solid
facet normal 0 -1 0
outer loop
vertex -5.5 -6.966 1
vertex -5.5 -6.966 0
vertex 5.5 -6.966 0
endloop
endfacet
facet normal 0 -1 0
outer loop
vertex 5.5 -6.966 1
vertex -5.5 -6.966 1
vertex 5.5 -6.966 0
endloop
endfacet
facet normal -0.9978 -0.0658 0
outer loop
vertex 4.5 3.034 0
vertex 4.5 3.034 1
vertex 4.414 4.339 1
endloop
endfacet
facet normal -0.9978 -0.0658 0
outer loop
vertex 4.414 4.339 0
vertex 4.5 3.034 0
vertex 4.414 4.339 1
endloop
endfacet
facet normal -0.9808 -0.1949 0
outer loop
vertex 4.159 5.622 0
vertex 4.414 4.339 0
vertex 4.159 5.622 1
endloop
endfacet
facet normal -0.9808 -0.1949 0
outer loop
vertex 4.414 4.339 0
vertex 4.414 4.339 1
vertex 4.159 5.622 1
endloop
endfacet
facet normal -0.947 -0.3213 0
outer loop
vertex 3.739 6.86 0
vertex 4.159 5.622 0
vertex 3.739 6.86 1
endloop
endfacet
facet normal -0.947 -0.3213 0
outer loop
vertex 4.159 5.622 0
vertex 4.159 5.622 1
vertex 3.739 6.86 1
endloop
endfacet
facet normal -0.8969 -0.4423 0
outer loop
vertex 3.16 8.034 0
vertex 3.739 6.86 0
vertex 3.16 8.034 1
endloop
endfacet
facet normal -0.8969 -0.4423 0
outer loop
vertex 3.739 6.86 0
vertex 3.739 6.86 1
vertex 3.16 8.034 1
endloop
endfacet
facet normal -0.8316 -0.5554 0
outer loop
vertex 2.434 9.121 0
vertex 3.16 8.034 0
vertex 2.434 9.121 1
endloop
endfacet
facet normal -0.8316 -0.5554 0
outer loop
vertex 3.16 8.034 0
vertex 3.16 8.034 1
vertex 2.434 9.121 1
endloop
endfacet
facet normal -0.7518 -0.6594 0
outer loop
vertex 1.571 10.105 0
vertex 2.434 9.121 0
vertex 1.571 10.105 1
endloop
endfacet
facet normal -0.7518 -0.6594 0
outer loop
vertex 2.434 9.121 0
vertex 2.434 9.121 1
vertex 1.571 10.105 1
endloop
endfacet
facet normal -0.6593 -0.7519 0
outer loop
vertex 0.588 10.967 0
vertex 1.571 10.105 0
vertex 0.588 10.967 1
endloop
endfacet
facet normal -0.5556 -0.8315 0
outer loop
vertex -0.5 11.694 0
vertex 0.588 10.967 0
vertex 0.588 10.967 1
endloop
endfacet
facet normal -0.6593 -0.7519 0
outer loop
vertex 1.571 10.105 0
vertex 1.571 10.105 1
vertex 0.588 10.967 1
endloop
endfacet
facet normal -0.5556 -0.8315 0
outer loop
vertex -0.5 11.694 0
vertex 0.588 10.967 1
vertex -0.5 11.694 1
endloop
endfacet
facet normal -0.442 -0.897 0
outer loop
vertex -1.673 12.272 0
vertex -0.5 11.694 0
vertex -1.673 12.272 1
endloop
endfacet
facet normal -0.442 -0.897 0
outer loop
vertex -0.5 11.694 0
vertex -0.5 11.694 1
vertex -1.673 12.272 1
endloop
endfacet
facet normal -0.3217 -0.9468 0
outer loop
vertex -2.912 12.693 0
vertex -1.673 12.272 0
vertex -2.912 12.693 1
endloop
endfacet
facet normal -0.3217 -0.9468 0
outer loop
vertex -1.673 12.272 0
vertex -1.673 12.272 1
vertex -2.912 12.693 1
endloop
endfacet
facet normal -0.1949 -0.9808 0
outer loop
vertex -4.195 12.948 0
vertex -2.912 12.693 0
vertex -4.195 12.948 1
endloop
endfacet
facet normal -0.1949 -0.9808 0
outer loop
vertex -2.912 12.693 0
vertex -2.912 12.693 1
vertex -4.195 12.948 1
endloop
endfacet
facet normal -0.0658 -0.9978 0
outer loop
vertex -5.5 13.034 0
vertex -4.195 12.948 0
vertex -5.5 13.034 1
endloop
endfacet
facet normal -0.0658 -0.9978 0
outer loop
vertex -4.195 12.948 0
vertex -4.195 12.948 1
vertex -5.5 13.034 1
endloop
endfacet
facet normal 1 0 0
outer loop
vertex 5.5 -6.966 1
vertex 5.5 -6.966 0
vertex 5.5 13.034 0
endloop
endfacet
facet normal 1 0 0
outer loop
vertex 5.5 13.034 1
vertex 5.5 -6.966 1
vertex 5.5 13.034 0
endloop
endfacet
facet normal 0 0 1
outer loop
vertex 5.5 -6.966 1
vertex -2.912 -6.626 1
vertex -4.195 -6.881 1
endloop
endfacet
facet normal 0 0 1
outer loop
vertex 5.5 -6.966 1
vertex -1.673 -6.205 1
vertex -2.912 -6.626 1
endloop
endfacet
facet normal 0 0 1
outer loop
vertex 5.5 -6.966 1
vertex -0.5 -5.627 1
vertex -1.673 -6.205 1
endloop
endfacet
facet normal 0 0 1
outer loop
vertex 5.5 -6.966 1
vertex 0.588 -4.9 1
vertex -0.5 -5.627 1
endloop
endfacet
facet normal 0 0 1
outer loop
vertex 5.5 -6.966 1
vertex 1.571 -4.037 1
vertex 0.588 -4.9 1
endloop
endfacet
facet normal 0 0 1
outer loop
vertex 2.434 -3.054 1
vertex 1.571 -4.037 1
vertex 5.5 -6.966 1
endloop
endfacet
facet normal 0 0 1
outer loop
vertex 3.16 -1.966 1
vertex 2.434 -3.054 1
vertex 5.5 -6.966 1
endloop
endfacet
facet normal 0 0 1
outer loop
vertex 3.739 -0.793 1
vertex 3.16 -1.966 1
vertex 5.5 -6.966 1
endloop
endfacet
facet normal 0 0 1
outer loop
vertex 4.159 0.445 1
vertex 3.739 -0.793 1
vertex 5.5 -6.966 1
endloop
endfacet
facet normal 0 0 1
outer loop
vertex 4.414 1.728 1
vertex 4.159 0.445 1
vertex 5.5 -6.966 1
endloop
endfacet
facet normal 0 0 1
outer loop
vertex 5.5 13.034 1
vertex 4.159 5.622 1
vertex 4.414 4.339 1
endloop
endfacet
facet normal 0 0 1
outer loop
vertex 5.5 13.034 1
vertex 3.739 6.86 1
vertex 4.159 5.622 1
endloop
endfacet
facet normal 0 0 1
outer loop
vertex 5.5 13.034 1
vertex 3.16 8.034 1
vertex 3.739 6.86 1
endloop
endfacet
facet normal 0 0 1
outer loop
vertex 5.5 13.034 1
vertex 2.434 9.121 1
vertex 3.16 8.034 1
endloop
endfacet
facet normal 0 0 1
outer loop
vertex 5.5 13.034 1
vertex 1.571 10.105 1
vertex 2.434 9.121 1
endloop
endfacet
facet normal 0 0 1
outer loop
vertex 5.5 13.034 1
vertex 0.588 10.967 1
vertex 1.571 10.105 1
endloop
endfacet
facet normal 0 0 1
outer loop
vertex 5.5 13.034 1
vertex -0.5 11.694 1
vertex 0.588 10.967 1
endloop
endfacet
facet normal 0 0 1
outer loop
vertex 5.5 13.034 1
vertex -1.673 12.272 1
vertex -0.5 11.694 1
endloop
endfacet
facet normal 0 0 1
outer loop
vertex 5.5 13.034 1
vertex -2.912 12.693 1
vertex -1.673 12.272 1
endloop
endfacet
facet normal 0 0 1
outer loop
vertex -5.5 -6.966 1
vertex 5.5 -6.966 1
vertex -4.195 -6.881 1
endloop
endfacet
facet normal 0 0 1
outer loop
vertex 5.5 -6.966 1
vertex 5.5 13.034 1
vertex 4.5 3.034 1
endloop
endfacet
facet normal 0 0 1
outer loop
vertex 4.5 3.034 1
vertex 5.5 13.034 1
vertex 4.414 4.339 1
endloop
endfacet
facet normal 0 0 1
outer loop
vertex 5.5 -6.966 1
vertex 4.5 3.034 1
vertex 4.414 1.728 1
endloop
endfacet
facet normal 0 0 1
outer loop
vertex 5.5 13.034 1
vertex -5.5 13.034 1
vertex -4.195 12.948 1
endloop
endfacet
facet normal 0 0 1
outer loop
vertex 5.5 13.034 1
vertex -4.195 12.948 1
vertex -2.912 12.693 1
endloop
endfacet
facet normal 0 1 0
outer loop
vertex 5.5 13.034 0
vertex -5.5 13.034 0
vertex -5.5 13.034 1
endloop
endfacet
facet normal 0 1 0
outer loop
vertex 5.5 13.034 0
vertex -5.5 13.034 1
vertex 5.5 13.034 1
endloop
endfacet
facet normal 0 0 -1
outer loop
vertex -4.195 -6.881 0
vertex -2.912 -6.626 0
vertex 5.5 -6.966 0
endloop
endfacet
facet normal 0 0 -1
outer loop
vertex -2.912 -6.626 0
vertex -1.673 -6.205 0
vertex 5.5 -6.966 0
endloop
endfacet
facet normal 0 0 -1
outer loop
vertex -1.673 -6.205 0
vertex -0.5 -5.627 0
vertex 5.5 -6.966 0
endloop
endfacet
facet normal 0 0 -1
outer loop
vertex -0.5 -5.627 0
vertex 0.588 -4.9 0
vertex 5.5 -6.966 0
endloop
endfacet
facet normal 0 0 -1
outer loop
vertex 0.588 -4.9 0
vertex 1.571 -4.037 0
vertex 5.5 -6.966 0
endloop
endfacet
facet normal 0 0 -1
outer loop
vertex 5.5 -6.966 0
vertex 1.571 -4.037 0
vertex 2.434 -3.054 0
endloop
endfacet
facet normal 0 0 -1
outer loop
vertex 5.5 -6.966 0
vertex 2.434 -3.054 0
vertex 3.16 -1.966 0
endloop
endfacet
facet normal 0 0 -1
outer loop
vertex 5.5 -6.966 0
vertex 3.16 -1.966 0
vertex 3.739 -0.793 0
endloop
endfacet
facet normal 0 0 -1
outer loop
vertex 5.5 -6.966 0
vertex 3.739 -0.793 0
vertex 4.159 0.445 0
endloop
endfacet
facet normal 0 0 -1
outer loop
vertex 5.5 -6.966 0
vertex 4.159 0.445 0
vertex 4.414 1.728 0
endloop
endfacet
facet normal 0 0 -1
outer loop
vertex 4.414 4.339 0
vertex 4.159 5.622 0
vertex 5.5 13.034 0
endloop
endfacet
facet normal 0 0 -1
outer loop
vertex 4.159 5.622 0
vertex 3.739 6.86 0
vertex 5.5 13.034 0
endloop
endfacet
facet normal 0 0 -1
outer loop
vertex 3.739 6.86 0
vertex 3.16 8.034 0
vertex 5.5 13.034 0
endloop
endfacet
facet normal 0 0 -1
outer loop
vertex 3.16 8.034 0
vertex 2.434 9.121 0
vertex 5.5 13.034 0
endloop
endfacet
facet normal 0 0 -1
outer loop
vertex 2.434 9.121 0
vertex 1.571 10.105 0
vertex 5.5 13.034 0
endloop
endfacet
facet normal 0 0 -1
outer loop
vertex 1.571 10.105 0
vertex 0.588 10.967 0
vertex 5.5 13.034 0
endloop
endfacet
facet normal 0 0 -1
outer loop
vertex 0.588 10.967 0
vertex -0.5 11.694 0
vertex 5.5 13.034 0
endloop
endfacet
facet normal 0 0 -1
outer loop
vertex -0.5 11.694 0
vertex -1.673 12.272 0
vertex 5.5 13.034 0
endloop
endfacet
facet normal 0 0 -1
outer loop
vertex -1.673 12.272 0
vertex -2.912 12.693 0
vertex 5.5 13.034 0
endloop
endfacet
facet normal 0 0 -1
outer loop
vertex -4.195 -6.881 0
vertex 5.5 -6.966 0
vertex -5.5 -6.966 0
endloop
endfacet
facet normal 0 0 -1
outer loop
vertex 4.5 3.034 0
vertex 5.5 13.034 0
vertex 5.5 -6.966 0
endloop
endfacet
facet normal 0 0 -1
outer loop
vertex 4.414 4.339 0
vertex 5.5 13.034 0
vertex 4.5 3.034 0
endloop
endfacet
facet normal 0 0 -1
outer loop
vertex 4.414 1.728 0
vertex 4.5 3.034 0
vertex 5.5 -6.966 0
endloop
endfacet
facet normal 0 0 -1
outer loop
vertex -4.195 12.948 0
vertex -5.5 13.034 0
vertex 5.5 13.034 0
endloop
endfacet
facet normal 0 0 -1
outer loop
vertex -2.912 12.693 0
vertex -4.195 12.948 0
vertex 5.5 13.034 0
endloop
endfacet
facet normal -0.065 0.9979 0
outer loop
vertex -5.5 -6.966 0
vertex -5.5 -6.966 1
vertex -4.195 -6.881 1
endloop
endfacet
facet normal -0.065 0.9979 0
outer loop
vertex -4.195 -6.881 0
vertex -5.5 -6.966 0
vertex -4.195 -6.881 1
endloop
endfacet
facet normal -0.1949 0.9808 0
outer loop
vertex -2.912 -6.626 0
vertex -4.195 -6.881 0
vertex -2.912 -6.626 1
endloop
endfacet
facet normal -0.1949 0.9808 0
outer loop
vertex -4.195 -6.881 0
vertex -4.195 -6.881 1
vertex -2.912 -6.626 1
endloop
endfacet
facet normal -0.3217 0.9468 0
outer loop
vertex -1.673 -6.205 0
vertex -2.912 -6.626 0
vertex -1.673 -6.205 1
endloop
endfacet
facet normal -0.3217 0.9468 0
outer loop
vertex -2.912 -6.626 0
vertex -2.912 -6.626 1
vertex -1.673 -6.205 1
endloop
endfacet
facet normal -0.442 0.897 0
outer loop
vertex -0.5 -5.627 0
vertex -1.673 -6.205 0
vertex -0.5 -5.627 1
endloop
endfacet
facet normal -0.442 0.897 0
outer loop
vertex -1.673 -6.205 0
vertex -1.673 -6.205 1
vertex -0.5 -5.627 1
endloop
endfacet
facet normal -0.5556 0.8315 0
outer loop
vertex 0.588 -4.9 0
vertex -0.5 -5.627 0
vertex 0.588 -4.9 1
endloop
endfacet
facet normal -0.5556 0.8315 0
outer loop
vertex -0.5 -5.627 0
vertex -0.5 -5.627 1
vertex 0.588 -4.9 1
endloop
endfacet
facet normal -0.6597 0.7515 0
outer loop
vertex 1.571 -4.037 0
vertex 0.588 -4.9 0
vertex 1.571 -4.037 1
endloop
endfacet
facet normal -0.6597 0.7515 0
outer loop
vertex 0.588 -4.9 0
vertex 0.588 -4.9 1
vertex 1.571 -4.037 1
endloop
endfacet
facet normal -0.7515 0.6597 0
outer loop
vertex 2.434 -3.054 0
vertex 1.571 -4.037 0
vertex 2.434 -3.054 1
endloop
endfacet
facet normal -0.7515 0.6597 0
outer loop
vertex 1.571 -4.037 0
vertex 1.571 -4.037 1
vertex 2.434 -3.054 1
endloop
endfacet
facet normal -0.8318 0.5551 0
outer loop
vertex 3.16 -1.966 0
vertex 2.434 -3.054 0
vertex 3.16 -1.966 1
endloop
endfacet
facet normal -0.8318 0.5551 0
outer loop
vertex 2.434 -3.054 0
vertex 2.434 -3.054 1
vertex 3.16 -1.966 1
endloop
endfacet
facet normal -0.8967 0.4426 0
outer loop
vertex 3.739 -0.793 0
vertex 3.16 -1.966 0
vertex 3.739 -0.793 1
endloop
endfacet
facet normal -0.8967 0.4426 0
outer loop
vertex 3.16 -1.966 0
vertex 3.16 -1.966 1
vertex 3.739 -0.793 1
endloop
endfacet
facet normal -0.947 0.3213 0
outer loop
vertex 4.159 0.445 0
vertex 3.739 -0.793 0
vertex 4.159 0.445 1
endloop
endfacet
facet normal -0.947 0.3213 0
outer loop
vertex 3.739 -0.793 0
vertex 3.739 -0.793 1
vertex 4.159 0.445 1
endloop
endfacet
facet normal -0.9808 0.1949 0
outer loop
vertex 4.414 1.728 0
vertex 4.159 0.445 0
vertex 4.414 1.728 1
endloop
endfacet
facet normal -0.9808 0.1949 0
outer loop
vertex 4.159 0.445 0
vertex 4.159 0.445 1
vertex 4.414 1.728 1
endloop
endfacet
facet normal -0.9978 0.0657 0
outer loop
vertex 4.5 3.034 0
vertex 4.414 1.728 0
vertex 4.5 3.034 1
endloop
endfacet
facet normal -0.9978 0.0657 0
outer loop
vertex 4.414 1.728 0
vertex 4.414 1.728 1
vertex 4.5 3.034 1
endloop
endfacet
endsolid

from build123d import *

# Parameters (mm, degrees)
F0_W          = 11
F0_H          = 20
F1_DEPTH      = 1
F3_DEPTH      = 25.4
F3_DEPTH_BACK = 25.4


with BuildPart() as f1:
    # F0 (on Top) → F1 (new body)
    with BuildSketch(Plane.XY):
        with Locations((0, 3.033641)):
            Rectangle(F0_W, F0_H)
    extrude(amount=F1_DEPTH)

    # F2 (on face) → F3 (cut, two sides)
    with BuildSketch(Plane.XY.offset(1)) as f3_sk:
        with BuildLine():
            ThreePointArc((-5.5, -6.966359), (1.571068, -4.037426), (4.5, 3.033641))
            ThreePointArc((4.5, 3.033641), (1.571068, 10.104709), (-5.5, 13.033641))
            Line((-5.5, 13.033641), (-5.5, -6.966359))
        make_face()
    extrude(amount=-F3_DEPTH, mode=Mode.SUBTRACT)
    extrude(f3_sk.sketch, amount=-F3_DEPTH_BACK, mode=Mode.SUBTRACT)


solid = f1.part
